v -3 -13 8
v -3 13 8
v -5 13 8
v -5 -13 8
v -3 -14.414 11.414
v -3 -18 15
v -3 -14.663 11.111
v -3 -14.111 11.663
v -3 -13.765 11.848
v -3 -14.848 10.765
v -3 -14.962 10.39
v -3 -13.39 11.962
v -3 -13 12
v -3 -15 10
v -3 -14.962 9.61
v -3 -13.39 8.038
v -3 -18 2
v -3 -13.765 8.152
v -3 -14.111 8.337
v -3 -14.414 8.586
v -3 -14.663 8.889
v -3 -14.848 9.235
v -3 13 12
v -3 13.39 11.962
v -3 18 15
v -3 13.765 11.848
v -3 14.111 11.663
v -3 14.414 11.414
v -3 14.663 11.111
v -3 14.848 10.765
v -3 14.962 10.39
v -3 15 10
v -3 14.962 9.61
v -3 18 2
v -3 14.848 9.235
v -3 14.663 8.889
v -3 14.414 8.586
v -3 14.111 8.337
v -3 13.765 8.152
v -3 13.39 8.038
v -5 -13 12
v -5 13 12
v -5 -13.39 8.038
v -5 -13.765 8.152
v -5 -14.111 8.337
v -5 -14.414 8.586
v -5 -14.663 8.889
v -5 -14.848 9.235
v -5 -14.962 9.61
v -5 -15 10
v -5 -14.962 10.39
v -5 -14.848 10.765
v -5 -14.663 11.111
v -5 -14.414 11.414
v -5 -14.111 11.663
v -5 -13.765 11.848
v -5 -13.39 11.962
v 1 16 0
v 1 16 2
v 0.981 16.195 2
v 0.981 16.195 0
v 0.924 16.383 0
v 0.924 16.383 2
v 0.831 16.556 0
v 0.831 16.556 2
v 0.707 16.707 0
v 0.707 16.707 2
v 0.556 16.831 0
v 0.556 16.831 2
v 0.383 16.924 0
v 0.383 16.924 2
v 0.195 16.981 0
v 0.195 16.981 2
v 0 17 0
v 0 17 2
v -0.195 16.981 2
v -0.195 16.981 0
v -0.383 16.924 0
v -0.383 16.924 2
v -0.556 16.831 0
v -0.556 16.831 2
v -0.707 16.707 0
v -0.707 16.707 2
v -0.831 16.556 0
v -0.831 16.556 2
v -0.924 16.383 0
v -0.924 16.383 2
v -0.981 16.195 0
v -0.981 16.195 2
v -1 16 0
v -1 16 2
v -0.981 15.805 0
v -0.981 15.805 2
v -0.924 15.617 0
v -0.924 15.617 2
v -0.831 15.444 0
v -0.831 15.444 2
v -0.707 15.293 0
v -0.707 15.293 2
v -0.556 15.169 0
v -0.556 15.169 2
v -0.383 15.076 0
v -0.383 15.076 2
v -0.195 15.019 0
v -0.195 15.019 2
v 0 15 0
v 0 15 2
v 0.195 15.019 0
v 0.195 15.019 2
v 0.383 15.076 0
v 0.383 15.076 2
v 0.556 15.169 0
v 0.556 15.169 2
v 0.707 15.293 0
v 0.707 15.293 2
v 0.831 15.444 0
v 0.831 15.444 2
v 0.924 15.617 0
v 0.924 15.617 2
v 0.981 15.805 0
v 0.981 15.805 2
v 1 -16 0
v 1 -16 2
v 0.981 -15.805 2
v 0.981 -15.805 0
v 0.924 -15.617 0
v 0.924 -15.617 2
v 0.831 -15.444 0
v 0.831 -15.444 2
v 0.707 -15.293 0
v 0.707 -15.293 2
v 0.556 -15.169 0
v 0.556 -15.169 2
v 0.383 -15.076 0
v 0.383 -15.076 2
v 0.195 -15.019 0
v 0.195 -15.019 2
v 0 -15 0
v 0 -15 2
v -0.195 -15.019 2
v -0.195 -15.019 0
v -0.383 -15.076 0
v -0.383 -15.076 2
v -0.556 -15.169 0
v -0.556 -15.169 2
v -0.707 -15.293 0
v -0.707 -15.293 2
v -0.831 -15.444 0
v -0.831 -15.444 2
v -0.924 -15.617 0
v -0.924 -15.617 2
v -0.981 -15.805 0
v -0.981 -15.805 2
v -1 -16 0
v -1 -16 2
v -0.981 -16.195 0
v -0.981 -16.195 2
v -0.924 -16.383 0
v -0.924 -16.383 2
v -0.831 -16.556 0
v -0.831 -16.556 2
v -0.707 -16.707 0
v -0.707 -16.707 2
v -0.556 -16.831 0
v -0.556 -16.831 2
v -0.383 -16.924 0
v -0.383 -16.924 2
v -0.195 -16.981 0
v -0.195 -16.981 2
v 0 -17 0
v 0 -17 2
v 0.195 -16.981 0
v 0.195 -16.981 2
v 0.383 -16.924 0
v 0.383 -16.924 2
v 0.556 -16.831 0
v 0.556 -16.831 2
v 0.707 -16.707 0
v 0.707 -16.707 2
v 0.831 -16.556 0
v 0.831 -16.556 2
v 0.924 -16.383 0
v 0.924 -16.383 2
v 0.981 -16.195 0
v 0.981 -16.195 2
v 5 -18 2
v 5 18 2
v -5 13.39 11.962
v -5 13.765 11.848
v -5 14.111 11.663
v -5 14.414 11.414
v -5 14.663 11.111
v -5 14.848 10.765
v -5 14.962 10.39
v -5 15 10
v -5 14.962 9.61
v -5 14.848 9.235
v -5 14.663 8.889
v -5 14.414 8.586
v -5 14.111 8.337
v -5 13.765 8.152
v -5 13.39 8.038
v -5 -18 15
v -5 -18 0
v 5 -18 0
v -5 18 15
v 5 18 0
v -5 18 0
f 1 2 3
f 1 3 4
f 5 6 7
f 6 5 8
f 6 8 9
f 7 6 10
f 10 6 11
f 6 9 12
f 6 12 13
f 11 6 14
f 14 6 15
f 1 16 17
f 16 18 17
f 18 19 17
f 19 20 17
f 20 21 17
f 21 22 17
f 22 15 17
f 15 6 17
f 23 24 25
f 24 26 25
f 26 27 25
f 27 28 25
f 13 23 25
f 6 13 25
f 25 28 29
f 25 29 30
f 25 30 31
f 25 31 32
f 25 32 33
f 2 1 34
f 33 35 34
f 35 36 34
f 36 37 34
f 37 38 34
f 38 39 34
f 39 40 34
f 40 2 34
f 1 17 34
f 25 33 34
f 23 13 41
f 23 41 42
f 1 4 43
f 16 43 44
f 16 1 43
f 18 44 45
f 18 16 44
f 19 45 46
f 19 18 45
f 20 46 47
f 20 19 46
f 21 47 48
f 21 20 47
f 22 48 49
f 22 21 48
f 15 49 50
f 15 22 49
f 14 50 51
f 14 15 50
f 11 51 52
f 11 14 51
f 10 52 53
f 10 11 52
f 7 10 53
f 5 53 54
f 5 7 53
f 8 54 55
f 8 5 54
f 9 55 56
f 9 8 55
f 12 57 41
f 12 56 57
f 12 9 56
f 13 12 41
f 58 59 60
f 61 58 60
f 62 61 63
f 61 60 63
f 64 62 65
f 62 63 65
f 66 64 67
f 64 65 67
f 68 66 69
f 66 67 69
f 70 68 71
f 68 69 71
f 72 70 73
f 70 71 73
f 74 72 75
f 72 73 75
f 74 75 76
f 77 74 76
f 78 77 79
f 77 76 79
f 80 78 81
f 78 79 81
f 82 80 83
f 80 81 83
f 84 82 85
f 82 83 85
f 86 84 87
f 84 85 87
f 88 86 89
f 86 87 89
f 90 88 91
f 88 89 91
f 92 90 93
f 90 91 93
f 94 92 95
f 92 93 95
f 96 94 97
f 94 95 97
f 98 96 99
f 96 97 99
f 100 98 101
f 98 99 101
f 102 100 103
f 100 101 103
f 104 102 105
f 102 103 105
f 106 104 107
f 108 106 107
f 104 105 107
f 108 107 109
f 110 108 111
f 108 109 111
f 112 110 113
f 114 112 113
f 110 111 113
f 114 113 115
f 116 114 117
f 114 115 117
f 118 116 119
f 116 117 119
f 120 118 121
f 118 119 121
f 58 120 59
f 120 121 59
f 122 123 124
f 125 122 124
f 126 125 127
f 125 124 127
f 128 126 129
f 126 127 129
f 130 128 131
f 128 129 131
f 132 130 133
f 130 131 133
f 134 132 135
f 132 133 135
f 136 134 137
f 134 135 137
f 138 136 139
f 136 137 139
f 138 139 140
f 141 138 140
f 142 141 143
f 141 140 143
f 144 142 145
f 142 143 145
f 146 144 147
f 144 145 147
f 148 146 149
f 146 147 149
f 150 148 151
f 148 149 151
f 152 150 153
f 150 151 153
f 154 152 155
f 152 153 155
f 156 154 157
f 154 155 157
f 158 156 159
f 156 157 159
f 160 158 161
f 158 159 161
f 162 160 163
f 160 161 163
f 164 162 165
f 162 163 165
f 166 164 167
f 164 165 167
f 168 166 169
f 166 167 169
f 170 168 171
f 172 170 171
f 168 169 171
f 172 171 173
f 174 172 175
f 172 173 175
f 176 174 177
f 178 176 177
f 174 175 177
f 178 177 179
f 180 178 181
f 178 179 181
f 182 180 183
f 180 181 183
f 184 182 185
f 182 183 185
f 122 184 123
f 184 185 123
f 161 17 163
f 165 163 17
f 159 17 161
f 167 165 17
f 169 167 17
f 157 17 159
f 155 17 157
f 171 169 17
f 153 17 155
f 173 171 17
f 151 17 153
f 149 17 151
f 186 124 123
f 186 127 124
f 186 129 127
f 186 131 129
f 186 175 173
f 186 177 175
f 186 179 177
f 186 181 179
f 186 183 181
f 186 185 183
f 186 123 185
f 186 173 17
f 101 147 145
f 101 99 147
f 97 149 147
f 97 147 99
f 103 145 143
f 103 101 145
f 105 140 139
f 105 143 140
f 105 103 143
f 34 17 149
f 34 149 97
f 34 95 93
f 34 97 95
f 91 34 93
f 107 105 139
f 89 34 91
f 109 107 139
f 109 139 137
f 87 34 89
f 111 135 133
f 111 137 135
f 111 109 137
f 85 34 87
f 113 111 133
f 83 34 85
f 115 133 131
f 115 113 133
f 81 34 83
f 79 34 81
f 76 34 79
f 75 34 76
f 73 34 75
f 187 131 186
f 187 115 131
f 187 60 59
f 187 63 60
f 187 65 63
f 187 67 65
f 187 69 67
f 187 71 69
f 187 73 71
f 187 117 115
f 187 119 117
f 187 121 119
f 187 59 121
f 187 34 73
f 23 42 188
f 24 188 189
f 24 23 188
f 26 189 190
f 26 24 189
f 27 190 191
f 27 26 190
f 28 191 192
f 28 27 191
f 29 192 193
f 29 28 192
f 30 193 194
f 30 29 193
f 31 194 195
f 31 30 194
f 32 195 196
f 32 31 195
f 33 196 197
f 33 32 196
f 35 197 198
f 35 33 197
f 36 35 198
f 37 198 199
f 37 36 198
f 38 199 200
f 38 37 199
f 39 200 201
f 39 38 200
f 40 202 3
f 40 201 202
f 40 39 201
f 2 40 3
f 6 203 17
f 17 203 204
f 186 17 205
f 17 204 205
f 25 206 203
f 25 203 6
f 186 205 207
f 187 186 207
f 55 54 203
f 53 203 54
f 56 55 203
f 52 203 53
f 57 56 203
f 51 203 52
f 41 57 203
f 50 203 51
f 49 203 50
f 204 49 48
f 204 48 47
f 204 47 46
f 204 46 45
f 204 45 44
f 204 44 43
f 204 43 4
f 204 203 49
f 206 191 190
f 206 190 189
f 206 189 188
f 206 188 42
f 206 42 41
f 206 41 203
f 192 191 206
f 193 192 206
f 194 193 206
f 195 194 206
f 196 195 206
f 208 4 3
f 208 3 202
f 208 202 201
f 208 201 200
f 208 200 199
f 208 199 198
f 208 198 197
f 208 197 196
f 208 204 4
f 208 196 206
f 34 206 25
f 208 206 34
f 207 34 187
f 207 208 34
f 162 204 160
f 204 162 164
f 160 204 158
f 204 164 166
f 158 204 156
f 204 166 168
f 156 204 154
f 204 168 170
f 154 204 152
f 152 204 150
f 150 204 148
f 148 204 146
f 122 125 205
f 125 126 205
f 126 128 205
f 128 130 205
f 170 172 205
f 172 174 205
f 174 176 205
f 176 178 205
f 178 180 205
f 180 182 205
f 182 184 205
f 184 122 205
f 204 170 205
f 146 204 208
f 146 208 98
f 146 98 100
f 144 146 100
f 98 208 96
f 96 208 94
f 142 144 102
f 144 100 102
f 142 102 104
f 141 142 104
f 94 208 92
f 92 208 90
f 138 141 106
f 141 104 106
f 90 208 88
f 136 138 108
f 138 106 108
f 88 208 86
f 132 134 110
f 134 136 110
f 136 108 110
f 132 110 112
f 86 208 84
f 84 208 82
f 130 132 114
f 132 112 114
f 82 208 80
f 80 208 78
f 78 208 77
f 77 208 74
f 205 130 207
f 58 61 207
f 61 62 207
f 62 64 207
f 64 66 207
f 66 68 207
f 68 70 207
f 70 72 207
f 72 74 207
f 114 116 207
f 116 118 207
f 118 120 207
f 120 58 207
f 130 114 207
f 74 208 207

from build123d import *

# Parameters (mm, degrees)
SKETCH2_W           = 10
SKETCH2_H           = 36
BOSS_EXTRUDE1_DEPTH = 2
SKETCH3_R           = 1
CUT_EXTRUDE1_DEPTH  = 2
SKETCH4_W           = 2
SKETCH4_H           = 36
BOSS_EXTRUDE2_DEPTH = 13
CUT_EXTRUDE2_DEPTH  = 10


with BuildPart() as part:
    # Sketch2 → Boss-Extrude1 (new body)
    with BuildSketch(Plane.XY):
        Rectangle(SKETCH2_W, SKETCH2_H)
    extrude(amount=BOSS_EXTRUDE1_DEPTH)

    # Sketch3 → Cut-Extrude1 (cut)
    with BuildSketch(Plane.XY.offset(2)):
        with Locations((0, 16)):
            Circle(SKETCH3_R)
        with Locations((0, -16)):
            Circle(SKETCH3_R)
    extrude(amount=-CUT_EXTRUDE1_DEPTH, mode=Mode.SUBTRACT)

    # Sketch4 → Boss-Extrude2 (add)
    with BuildSketch(Plane.XY.offset(2)):
        with Locations((-4, 0)):
            Rectangle(SKETCH4_W, SKETCH4_H)
    extrude(amount=BOSS_EXTRUDE2_DEPTH)

    # Sketch5 → Cut-Extrude2 (cut)
    with BuildSketch(Plane(origin=(-3, 0, 0), x_dir=(0, 0, -1), z_dir=(1, 0, 0))):
        with BuildLine():
            Line((-8, 13), (-8, -13))
            ThreePointArc((-8, -13), (-10, -15), (-12, -13))
            Line((-12, -13), (-12, 13))
            ThreePointArc((-12, 13), (-10, 15), (-8, 13))
        make_face()
    extrude(amount=-CUT_EXTRUDE2_DEPTH, mode=Mode.SUBTRACT)


solid = part.part
